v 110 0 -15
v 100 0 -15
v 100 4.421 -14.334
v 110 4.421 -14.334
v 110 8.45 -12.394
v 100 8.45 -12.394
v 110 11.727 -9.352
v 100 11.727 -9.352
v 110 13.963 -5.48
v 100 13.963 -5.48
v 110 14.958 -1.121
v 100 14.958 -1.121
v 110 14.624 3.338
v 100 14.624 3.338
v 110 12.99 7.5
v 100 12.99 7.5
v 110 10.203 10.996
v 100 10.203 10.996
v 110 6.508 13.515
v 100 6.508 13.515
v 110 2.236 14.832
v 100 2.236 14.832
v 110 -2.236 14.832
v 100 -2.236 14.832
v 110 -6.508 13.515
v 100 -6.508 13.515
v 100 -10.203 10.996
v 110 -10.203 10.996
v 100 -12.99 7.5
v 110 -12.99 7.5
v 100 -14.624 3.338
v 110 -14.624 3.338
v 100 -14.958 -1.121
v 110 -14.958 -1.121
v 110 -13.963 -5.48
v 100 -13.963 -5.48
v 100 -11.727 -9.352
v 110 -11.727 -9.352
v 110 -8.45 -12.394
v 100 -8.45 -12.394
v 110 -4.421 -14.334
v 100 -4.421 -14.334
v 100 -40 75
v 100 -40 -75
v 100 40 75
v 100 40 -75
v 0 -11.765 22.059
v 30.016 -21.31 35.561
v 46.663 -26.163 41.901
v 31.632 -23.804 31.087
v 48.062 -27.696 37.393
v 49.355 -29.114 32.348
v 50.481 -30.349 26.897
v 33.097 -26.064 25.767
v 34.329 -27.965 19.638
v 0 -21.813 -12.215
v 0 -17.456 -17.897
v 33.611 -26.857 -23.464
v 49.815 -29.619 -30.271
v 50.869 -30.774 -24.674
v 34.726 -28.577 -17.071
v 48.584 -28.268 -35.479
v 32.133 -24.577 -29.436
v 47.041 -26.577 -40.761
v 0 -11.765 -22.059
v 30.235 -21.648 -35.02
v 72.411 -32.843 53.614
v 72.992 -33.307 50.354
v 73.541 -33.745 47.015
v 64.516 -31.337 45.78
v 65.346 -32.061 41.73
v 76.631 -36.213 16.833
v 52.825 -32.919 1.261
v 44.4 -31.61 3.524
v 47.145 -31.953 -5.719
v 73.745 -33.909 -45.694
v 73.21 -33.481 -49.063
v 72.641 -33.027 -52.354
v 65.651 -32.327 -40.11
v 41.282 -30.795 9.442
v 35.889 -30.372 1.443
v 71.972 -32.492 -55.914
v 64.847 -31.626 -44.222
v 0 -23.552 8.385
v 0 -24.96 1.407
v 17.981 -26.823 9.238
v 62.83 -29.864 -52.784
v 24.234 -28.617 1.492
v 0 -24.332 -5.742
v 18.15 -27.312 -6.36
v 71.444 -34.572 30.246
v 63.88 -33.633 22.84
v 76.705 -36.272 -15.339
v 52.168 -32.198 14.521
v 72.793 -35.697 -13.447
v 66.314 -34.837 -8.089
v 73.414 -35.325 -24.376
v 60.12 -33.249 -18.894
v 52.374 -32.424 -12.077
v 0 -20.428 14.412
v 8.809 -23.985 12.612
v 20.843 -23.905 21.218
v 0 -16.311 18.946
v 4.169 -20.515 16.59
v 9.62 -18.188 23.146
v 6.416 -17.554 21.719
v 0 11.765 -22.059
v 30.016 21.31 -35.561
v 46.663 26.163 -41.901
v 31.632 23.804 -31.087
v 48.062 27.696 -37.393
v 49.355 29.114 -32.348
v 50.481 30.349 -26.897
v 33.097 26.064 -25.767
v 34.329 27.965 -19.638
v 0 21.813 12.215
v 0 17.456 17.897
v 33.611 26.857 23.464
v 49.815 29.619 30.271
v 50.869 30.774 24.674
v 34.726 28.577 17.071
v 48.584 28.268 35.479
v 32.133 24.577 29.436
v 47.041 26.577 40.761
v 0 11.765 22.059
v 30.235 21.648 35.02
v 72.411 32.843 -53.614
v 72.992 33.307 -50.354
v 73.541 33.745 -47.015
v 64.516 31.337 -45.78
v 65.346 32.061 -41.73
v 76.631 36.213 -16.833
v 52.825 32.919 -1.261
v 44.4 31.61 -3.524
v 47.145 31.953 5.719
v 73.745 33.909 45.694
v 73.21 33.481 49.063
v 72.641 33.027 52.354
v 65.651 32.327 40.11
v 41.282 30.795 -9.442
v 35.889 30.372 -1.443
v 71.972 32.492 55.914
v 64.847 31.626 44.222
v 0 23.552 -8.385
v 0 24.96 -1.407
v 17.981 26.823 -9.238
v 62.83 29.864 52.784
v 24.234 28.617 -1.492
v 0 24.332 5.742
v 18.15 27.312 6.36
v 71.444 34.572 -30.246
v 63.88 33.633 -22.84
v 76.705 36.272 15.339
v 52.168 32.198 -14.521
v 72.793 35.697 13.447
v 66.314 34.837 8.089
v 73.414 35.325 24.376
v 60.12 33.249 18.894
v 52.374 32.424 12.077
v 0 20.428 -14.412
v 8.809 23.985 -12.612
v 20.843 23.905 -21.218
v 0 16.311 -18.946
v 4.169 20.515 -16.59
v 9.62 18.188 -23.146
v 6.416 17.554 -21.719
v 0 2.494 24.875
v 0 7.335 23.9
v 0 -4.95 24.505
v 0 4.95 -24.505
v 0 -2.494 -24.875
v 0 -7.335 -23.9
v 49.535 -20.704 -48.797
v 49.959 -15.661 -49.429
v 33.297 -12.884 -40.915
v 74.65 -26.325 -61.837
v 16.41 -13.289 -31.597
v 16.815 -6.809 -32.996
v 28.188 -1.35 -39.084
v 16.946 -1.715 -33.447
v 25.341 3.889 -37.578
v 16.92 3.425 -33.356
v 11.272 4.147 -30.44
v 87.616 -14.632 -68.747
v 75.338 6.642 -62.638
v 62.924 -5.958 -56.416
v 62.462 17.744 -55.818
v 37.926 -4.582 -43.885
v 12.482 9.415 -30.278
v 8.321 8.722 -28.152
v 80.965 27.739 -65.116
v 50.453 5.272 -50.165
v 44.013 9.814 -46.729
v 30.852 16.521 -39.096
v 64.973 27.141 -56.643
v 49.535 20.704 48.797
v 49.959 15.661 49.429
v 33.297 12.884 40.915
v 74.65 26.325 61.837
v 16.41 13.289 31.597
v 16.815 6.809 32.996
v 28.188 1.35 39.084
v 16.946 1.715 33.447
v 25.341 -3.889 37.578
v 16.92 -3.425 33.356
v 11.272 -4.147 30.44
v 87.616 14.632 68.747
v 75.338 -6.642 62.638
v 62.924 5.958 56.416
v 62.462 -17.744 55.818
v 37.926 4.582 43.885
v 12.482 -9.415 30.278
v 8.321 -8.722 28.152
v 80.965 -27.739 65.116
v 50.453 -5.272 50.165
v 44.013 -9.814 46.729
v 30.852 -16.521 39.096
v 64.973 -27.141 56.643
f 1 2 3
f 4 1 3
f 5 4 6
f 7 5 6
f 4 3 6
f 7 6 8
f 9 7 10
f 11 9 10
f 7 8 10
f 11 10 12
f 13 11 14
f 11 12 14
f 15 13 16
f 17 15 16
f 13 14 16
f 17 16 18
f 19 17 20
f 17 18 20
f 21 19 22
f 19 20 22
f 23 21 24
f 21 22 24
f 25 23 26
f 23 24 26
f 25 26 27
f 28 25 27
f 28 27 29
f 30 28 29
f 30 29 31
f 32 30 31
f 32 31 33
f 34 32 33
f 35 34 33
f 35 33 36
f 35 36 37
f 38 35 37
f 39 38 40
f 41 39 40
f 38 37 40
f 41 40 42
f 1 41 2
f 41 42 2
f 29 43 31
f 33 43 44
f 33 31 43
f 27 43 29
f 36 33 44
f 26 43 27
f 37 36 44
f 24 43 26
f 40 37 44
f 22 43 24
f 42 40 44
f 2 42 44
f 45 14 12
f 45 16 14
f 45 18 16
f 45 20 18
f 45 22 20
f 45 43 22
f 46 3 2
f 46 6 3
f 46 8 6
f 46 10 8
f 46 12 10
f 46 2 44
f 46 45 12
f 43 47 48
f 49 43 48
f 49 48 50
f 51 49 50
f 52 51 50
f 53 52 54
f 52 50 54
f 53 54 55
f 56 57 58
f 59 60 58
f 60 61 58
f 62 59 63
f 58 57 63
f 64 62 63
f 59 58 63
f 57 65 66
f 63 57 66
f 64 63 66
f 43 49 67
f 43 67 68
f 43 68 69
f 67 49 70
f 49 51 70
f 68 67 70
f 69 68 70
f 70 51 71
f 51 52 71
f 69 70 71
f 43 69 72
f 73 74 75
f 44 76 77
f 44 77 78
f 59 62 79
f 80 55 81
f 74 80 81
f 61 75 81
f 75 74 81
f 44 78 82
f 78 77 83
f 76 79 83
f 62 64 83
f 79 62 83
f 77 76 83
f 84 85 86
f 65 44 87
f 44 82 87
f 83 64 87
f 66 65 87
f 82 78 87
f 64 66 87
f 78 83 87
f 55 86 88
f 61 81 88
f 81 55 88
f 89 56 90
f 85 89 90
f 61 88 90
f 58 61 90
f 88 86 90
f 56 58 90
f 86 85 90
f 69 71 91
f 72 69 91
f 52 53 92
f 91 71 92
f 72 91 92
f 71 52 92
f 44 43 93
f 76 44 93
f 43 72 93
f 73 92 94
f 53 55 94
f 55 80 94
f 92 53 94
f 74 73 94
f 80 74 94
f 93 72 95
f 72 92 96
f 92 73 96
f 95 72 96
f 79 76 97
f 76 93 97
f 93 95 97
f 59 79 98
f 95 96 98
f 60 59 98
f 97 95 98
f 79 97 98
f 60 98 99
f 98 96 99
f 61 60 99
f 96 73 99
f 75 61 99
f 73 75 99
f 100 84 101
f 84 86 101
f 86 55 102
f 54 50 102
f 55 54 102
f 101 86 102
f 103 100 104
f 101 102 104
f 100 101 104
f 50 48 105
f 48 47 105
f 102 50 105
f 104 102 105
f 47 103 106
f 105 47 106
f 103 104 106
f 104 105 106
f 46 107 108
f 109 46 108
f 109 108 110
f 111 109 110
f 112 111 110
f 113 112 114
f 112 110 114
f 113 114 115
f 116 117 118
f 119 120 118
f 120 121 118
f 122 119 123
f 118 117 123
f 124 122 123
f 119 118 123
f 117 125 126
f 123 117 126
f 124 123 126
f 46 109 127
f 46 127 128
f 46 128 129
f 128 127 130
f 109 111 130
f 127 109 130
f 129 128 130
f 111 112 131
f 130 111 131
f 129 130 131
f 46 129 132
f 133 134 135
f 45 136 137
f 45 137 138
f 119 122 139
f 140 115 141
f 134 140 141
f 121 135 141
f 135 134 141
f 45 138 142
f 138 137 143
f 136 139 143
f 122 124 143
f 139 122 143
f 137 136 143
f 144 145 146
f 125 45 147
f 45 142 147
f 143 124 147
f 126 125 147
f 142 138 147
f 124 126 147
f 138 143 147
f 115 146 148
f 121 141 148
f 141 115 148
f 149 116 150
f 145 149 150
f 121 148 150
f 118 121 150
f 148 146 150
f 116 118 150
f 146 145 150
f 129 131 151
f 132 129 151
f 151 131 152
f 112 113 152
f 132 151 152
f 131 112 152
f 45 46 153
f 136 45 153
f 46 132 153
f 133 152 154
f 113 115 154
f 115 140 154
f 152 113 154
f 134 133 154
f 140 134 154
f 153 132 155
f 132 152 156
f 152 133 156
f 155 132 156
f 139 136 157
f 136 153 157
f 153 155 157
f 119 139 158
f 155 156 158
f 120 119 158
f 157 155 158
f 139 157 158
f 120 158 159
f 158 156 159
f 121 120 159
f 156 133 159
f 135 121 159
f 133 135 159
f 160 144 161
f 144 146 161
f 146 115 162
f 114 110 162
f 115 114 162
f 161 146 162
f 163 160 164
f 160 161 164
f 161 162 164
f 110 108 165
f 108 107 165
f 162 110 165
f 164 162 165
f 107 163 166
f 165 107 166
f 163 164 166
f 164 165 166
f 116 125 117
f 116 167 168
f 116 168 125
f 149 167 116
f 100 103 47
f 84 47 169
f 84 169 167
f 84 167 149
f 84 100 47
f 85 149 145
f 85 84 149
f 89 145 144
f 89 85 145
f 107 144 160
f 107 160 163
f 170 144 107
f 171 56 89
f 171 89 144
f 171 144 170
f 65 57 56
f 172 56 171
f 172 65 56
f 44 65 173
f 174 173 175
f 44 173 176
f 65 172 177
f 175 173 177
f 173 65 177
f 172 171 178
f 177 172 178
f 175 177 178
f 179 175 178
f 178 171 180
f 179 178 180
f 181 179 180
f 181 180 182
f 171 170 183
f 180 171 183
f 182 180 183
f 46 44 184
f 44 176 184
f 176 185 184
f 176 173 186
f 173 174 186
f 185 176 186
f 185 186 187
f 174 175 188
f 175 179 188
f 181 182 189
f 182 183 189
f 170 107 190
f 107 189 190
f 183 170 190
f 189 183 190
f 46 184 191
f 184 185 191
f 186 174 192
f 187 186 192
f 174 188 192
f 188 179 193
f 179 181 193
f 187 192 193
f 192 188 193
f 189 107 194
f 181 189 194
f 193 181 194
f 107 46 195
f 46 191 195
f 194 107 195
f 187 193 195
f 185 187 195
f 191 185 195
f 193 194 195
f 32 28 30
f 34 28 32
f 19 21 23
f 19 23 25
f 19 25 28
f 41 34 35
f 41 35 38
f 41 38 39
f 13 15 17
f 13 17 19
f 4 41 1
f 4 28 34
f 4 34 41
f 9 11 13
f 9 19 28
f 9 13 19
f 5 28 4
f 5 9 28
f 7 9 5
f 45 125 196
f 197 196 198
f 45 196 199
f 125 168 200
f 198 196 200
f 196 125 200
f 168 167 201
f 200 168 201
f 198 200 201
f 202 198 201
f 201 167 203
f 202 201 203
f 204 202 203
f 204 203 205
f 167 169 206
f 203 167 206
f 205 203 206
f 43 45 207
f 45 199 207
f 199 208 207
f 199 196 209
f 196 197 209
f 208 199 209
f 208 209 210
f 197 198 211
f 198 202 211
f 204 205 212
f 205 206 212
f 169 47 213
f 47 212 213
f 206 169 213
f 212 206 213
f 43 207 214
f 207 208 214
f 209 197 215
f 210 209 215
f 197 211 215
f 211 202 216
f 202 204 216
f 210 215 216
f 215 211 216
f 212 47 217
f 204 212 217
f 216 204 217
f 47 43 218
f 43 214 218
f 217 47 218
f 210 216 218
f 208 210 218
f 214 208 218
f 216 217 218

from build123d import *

# Parameters (mm, degrees)
SKETCH2_W           = 150
SKETCH2_H           = 80
SKETCH3_R           = 15
BOSS_EXTRUDE1_DEPTH = 10


with BuildPart() as part:
    # Sketch2 → Loft1 section 0
    with BuildSketch(Plane(origin=(100, 0, 0), x_dir=(0, 0, -1), z_dir=(1, 0, 0))):
        Rectangle(SKETCH2_W, SKETCH2_H)
    # Sketch1 for Loft1 → Loft1 section 1
    with BuildSketch(Plane(origin=(0, 0, 0), x_dir=(0, 0, -1), z_dir=(1, 0, 0))):
        with BuildLine():
            # circular arc as an exact rational Bezier (weights 1, cos(half-angle), 1)
            Bezier((-22.058823529, 11.764705882), (0, 53.125000003), (22.058823529, 11.764705882), weights=[1, 0.470588235, 1])
            Bezier((22.058823529, 11.764705882), (28.333333334, 0), (22.058823529, -11.764705882), weights=[1, 0.882352941, 1])
            Bezier((22.058823529, -11.764705882), (0, -53.125000003), (-22.058823529, -11.764705882), weights=[1, 0.470588235, 1])
            Bezier((-22.058823529, -11.764705882), (-28.333333334, 0), (-22.058823529, 11.764705882), weights=[1, 0.882352941, 1])
        make_face()
    loft()

    # Sketch3 → Boss-Extrude1 (add)
    with BuildSketch(Plane(origin=(100, 0, 0), x_dir=(0, 0, -1), z_dir=(1, 0, 0))):
        Circle(SKETCH3_R)
    extrude(amount=BOSS_EXTRUDE1_DEPTH)


solid = part.part
